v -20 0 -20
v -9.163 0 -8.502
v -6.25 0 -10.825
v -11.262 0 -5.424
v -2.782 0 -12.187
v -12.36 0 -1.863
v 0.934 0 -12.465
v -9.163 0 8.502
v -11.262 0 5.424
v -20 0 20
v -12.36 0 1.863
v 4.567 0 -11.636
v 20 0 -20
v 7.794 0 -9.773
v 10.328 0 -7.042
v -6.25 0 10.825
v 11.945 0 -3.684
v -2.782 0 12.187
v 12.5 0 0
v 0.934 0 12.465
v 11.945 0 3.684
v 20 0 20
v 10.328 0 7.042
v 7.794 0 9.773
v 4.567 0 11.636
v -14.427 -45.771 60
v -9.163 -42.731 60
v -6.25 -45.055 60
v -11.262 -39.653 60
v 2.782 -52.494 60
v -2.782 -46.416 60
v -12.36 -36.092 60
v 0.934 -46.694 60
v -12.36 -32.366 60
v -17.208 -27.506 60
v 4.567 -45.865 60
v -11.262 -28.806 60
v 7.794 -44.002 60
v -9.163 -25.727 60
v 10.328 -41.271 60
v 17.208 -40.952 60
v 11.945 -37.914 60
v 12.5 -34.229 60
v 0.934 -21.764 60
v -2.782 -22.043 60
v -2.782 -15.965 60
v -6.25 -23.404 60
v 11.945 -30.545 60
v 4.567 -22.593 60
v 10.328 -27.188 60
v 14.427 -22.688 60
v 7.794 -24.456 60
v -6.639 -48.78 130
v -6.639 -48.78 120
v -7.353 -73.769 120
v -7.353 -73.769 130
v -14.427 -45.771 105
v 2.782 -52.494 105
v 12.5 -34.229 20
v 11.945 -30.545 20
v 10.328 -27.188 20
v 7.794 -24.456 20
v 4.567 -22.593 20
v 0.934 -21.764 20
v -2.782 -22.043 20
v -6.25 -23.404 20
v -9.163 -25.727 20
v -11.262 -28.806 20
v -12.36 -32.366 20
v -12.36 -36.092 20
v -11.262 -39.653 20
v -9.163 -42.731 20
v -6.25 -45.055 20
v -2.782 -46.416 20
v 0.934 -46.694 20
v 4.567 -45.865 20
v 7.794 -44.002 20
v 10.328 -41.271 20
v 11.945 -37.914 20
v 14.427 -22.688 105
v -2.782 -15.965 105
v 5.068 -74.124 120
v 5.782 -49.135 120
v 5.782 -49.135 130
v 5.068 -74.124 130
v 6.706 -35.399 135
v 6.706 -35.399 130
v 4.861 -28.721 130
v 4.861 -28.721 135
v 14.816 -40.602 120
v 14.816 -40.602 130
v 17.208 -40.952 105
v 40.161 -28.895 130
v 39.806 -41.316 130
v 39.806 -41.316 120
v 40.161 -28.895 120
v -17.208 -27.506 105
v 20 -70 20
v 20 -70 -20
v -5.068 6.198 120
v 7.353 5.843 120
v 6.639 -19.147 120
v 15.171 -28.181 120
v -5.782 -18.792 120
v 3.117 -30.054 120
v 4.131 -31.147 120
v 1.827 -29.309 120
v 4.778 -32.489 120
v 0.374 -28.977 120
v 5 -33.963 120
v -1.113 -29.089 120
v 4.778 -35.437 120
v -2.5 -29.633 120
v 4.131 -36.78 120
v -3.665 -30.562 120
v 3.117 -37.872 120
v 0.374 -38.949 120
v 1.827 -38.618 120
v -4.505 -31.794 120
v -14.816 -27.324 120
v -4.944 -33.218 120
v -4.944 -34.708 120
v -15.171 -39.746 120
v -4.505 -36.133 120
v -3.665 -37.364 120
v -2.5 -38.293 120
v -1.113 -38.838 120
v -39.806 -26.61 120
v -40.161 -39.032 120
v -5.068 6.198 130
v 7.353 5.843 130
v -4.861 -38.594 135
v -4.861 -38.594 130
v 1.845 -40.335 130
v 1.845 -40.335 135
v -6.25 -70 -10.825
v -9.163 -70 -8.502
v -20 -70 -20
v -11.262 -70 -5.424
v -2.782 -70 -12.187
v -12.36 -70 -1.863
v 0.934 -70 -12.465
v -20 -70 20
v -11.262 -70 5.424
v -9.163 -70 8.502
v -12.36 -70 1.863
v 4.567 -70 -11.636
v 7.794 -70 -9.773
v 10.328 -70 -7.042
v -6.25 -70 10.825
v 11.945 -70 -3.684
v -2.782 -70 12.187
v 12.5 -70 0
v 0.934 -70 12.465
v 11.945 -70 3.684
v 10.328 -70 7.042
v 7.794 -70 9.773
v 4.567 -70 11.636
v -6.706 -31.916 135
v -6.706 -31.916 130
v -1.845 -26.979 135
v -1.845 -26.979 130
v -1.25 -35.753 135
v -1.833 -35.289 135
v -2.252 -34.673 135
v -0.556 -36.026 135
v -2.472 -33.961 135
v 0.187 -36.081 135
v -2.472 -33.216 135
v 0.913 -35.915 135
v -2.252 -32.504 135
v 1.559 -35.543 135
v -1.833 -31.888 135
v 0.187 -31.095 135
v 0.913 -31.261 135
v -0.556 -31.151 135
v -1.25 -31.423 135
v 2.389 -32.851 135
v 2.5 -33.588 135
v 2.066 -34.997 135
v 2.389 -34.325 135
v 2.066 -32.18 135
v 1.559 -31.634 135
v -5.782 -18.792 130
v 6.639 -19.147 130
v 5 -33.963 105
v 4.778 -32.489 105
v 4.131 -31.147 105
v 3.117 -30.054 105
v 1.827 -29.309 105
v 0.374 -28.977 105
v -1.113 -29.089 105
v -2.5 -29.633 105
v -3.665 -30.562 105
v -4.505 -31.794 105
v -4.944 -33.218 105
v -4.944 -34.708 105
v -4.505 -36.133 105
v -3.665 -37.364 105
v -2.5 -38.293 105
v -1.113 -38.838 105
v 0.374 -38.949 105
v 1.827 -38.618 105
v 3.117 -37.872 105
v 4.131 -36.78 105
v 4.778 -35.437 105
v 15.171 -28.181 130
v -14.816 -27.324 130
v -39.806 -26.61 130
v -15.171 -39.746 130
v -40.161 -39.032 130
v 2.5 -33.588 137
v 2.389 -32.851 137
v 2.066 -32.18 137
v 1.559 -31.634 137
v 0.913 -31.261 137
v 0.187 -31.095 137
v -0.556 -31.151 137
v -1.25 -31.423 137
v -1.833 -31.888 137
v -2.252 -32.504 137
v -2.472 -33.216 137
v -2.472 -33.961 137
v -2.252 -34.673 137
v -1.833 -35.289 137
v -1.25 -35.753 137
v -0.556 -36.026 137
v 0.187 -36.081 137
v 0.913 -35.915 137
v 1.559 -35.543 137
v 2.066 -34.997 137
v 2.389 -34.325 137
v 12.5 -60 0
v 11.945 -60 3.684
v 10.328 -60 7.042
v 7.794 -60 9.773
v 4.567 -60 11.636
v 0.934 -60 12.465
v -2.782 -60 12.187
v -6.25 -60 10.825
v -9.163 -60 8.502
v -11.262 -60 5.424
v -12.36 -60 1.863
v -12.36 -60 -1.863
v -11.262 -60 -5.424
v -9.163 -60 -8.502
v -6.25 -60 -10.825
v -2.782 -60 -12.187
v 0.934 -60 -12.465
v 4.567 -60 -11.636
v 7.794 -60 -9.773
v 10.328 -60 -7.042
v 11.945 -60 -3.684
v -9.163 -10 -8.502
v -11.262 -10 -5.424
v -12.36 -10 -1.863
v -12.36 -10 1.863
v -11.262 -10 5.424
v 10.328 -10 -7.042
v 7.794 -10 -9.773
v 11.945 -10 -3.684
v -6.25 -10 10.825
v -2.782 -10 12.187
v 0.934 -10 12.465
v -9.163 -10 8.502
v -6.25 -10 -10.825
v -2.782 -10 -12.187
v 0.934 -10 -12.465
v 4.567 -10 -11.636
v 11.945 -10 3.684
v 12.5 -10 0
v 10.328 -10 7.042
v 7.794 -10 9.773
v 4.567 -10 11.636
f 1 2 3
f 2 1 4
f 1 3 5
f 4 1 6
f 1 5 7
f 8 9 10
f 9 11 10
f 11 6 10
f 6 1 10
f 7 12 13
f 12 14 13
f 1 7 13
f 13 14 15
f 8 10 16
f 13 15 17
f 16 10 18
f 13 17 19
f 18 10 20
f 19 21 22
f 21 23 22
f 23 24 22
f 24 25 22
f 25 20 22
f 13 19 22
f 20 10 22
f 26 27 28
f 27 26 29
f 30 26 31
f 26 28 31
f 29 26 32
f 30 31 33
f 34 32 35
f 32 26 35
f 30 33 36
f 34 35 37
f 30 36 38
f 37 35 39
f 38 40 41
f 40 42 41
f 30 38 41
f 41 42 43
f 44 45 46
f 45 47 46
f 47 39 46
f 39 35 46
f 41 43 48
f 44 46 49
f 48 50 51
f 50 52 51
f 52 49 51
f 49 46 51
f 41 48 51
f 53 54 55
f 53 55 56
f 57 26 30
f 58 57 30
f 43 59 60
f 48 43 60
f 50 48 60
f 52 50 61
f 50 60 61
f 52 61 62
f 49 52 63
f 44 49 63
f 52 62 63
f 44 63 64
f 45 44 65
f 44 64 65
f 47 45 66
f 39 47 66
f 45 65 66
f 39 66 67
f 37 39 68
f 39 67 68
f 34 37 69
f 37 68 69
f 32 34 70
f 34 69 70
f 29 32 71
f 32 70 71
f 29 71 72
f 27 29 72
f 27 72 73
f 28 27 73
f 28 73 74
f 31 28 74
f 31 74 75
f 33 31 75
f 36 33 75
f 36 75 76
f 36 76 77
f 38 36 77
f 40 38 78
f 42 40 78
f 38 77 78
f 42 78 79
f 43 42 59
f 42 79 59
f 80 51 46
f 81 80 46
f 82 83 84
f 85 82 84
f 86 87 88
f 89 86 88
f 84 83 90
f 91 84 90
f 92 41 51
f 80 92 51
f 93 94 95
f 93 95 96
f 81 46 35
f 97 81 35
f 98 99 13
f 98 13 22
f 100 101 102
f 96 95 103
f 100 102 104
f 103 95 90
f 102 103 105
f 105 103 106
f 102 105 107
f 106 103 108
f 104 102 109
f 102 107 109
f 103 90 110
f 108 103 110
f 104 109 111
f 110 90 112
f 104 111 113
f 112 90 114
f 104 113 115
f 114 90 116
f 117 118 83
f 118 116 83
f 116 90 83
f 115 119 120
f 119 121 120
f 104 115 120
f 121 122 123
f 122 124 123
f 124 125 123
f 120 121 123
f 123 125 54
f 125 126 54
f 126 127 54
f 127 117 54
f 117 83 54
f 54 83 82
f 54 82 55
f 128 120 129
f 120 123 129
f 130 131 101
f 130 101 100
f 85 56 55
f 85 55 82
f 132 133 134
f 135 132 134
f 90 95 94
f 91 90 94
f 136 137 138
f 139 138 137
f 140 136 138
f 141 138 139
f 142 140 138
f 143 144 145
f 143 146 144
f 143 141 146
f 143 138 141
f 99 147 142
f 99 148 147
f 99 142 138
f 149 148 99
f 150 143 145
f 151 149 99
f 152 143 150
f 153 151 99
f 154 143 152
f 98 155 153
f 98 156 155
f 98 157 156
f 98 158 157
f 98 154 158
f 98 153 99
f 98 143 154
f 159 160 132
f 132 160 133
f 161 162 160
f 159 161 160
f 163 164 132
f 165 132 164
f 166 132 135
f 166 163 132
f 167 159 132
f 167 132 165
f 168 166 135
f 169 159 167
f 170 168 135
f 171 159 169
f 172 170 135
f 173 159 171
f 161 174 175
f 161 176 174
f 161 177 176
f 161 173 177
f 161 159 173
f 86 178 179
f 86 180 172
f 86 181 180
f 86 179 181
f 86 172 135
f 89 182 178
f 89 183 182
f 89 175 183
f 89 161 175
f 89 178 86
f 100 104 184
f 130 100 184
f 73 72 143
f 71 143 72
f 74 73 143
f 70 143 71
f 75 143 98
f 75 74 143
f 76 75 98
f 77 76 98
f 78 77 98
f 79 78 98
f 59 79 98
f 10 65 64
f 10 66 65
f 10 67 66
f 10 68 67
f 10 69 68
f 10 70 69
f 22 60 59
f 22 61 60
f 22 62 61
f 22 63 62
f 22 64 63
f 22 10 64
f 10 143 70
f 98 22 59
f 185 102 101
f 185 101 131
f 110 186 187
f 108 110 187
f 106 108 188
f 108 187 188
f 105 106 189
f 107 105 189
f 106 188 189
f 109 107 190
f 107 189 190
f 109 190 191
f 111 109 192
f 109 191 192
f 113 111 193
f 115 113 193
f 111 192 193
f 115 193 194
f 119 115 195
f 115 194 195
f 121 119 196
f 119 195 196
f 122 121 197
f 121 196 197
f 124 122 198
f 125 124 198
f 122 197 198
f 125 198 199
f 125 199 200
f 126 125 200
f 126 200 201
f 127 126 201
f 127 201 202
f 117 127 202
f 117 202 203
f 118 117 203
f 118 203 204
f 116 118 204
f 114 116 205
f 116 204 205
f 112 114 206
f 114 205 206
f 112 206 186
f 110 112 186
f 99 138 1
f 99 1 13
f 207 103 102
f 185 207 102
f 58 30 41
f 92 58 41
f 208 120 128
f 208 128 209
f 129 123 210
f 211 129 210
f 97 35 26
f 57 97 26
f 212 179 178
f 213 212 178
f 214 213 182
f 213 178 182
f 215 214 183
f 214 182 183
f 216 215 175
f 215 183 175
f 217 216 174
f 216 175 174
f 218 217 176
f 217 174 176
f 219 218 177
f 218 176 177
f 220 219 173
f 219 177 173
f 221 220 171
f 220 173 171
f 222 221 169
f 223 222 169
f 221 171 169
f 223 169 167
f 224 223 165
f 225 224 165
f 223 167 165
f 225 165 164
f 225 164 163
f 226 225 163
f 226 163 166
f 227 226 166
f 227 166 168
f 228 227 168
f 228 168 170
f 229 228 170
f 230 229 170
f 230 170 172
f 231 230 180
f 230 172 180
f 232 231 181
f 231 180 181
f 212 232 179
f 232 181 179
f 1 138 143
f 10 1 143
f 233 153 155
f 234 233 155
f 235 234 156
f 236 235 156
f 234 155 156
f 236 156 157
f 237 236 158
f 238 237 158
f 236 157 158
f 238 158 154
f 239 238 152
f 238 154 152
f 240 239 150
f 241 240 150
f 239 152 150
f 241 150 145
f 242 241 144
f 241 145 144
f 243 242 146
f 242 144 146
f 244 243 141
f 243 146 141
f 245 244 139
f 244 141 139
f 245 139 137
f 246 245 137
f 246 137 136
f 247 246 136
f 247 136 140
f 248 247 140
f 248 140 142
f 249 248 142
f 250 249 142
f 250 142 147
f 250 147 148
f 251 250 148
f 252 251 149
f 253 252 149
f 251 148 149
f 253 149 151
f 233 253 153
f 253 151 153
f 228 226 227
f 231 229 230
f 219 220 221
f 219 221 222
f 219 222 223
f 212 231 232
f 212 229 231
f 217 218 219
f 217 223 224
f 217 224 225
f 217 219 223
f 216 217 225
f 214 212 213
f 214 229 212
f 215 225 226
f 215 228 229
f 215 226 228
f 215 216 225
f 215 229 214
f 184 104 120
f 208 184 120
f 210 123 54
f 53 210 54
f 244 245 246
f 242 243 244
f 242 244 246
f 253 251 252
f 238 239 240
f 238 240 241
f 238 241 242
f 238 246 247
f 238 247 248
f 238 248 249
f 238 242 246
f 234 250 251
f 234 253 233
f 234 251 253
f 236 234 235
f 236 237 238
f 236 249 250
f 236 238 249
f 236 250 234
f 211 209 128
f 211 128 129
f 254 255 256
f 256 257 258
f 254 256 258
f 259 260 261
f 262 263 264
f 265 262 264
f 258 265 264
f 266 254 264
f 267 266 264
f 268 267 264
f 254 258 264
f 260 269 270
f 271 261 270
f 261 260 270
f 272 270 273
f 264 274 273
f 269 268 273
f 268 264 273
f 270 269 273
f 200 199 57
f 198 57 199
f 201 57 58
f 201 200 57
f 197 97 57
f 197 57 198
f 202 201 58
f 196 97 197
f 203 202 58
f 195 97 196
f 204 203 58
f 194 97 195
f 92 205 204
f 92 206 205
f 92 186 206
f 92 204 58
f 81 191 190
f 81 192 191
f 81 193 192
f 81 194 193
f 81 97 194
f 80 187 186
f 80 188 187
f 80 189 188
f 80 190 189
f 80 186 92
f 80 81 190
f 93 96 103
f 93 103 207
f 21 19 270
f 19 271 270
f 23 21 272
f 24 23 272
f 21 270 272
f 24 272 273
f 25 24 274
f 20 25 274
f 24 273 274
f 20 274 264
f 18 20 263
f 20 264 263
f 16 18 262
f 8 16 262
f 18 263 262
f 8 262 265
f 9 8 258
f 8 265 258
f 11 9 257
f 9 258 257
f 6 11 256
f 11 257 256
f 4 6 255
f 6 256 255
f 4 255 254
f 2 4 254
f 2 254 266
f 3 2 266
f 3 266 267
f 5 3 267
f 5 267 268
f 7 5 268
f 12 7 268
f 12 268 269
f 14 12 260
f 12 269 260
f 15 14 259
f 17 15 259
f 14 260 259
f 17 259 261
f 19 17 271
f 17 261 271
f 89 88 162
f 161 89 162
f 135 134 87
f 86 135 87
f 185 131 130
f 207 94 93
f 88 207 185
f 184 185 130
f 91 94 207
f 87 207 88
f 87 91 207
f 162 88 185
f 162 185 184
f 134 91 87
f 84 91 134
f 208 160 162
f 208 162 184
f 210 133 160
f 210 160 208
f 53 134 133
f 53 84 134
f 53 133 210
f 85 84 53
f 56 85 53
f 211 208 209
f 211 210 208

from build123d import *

# Parameters (mm, degrees)
F0_W      = 40
F0_H      = 40
F1_DEPTH  = 70
F2_R      = 12.5
F3_DEPTH  = 10
F4_R      = 12.5
F5_DEPTH  = 10
F6_R      = 12.5
F7_DEPTH  = 40
F9_DEPTH  = 45
F10_R     = 5
F11_DEPTH = 15
F13_DEPTH = 10
F14_W     = 12.4264068712
F14_H     = 10
F15_DEPTH = 25
F16_W     = 12.4264068712
F16_H     = 10
F17_DEPTH = 25
F18_W     = 12.4264068712
F18_H     = 10
F19_DEPTH = 25
F20_W     = 12.4264068712
F20_H     = 10
F21_DEPTH = 25
F23_DEPTH = 5
F24_R     = 2.5
F25_DEPTH = 2


with BuildPart() as f1:
    # F0 (on Front) → F1 (new body)
    with BuildSketch(Plane.XZ):
        Rectangle(F0_W, F0_H)
    extrude(amount=F1_DEPTH)

    # F2 (on Front) → F3 (cut, symmetric)
    with BuildSketch(Plane.XZ):
        Circle(F2_R)
    extrude(amount=F3_DEPTH, both=True, mode=Mode.SUBTRACT)

    # F4 (on face) → F5 (cut, symmetric)
    with BuildSketch(Plane.XZ.offset(70)):
        Circle(F4_R)
    extrude(amount=F5_DEPTH, both=True, mode=Mode.SUBTRACT)

    # F6 (on face) → F7 (join)
    with BuildSketch(Plane.XY.offset(20)):
        with Locations((0, -34.2291915306)):
            Circle(F6_R)
    extrude(amount=F7_DEPTH)

    # F8 (on face) → F9 (join)
    with BuildSketch(Plane.XY.offset(60)):
        Polygon((-2.7817631709, -15.9646048395), (-17.2084776495, -27.5059757583), (-14.4267144786, -45.7705624494), (2.7817631709, -52.4937782216), (17.2084776495, -40.9524073028), (14.4267144786, -22.6878206118), align=None)
    extrude(amount=F9_DEPTH)

    # F10 (on face) → F11 (join)
    with BuildSketch(Plane.XY.offset(105)):
        with Locations((0, -33.963235583)):
            Circle(F10_R)
    extrude(amount=F11_DEPTH)

    # F12 (on face) → F13 (join)
    with BuildSketch(Plane.XY.offset(120)):
        Polygon((15.1713289677, -28.1809631677), (6.6390655572, -19.1468019547), (-5.7822724153, -18.7919066152), (-14.8164336282, -27.3241700258), (-15.1713289677, -39.7455079982), (-6.6390655572, -48.7796692112), (5.7822724153, -49.1345645507), (14.8164336282, -40.6023011401), align=None)
    extrude(amount=F13_DEPTH)

    # F14 (on face) → F15 (join)
    with BuildSketch(Plane(origin=(-1.3979831463, -48.9294144098, 0), x_dir=(0.9995920865, -0.0285597714, 0), z_dir=(-0.0285597714, -0.9995920865, 0))):
        with Locations((0.9699822441, 125)):
            Rectangle(F14_W, F14_H)
    extrude(amount=F15_DEPTH)

    # F16 (on face) → F17 (join)
    with BuildSketch(Plane(origin=(15.9634678733, -0.4560990421, 0), x_dir=(0.0285597714, 0.9995920865, 0), z_dir=(0.9995920865, -0.0285597714, 0))):
        with Locations((-33.9493815218, 125)):
            Rectangle(F16_W, F16_H)
    extrude(amount=F17_DEPTH)

    # F18 (on face) → F19 (join)
    with BuildSketch(Plane(origin=(-14.0242947227, 0.4006940998, 0), x_dir=(-0.0285597714, -0.9995920865, 0), z_dir=(-0.9995920865, 0.0285597714, 0))):
        with Locations((33.9493815218, 125)):
            Rectangle(F18_W, F18_H)
    extrude(amount=F19_DEPTH)

    # F20 (on face) → F21 (join)
    with BuildSketch(Plane(origin=(-0.5411900044, -18.9416518138, 0), x_dir=(-0.9995920865, 0.0285597714, 0), z_dir=(0.0285597714, 0.9995920865, 0))):
        with Locations((-0.9699822441, 125)):
            Rectangle(F20_W, F20_H)
    extrude(amount=F21_DEPTH)

    # F22 (on face) → F23 (join)
    with BuildSketch(Plane.XY.offset(130)):
        Polygon((-1.8446433706, -26.9791675509), (-6.7057435207, -31.9157357243), (-4.8611001501, -38.5938560313), (1.8446433706, -40.335408165), (6.7057435207, -35.3988399916), (4.8611001501, -28.7207196846), align=None)
    extrude(amount=F23_DEPTH)

    # F24 (on face) → F25 (join)
    with BuildSketch(Plane.XY.offset(135)):
        with Locations((0, -33.5882875384)):
            Circle(F24_R)
    extrude(amount=F25_DEPTH)


solid = f1.part
